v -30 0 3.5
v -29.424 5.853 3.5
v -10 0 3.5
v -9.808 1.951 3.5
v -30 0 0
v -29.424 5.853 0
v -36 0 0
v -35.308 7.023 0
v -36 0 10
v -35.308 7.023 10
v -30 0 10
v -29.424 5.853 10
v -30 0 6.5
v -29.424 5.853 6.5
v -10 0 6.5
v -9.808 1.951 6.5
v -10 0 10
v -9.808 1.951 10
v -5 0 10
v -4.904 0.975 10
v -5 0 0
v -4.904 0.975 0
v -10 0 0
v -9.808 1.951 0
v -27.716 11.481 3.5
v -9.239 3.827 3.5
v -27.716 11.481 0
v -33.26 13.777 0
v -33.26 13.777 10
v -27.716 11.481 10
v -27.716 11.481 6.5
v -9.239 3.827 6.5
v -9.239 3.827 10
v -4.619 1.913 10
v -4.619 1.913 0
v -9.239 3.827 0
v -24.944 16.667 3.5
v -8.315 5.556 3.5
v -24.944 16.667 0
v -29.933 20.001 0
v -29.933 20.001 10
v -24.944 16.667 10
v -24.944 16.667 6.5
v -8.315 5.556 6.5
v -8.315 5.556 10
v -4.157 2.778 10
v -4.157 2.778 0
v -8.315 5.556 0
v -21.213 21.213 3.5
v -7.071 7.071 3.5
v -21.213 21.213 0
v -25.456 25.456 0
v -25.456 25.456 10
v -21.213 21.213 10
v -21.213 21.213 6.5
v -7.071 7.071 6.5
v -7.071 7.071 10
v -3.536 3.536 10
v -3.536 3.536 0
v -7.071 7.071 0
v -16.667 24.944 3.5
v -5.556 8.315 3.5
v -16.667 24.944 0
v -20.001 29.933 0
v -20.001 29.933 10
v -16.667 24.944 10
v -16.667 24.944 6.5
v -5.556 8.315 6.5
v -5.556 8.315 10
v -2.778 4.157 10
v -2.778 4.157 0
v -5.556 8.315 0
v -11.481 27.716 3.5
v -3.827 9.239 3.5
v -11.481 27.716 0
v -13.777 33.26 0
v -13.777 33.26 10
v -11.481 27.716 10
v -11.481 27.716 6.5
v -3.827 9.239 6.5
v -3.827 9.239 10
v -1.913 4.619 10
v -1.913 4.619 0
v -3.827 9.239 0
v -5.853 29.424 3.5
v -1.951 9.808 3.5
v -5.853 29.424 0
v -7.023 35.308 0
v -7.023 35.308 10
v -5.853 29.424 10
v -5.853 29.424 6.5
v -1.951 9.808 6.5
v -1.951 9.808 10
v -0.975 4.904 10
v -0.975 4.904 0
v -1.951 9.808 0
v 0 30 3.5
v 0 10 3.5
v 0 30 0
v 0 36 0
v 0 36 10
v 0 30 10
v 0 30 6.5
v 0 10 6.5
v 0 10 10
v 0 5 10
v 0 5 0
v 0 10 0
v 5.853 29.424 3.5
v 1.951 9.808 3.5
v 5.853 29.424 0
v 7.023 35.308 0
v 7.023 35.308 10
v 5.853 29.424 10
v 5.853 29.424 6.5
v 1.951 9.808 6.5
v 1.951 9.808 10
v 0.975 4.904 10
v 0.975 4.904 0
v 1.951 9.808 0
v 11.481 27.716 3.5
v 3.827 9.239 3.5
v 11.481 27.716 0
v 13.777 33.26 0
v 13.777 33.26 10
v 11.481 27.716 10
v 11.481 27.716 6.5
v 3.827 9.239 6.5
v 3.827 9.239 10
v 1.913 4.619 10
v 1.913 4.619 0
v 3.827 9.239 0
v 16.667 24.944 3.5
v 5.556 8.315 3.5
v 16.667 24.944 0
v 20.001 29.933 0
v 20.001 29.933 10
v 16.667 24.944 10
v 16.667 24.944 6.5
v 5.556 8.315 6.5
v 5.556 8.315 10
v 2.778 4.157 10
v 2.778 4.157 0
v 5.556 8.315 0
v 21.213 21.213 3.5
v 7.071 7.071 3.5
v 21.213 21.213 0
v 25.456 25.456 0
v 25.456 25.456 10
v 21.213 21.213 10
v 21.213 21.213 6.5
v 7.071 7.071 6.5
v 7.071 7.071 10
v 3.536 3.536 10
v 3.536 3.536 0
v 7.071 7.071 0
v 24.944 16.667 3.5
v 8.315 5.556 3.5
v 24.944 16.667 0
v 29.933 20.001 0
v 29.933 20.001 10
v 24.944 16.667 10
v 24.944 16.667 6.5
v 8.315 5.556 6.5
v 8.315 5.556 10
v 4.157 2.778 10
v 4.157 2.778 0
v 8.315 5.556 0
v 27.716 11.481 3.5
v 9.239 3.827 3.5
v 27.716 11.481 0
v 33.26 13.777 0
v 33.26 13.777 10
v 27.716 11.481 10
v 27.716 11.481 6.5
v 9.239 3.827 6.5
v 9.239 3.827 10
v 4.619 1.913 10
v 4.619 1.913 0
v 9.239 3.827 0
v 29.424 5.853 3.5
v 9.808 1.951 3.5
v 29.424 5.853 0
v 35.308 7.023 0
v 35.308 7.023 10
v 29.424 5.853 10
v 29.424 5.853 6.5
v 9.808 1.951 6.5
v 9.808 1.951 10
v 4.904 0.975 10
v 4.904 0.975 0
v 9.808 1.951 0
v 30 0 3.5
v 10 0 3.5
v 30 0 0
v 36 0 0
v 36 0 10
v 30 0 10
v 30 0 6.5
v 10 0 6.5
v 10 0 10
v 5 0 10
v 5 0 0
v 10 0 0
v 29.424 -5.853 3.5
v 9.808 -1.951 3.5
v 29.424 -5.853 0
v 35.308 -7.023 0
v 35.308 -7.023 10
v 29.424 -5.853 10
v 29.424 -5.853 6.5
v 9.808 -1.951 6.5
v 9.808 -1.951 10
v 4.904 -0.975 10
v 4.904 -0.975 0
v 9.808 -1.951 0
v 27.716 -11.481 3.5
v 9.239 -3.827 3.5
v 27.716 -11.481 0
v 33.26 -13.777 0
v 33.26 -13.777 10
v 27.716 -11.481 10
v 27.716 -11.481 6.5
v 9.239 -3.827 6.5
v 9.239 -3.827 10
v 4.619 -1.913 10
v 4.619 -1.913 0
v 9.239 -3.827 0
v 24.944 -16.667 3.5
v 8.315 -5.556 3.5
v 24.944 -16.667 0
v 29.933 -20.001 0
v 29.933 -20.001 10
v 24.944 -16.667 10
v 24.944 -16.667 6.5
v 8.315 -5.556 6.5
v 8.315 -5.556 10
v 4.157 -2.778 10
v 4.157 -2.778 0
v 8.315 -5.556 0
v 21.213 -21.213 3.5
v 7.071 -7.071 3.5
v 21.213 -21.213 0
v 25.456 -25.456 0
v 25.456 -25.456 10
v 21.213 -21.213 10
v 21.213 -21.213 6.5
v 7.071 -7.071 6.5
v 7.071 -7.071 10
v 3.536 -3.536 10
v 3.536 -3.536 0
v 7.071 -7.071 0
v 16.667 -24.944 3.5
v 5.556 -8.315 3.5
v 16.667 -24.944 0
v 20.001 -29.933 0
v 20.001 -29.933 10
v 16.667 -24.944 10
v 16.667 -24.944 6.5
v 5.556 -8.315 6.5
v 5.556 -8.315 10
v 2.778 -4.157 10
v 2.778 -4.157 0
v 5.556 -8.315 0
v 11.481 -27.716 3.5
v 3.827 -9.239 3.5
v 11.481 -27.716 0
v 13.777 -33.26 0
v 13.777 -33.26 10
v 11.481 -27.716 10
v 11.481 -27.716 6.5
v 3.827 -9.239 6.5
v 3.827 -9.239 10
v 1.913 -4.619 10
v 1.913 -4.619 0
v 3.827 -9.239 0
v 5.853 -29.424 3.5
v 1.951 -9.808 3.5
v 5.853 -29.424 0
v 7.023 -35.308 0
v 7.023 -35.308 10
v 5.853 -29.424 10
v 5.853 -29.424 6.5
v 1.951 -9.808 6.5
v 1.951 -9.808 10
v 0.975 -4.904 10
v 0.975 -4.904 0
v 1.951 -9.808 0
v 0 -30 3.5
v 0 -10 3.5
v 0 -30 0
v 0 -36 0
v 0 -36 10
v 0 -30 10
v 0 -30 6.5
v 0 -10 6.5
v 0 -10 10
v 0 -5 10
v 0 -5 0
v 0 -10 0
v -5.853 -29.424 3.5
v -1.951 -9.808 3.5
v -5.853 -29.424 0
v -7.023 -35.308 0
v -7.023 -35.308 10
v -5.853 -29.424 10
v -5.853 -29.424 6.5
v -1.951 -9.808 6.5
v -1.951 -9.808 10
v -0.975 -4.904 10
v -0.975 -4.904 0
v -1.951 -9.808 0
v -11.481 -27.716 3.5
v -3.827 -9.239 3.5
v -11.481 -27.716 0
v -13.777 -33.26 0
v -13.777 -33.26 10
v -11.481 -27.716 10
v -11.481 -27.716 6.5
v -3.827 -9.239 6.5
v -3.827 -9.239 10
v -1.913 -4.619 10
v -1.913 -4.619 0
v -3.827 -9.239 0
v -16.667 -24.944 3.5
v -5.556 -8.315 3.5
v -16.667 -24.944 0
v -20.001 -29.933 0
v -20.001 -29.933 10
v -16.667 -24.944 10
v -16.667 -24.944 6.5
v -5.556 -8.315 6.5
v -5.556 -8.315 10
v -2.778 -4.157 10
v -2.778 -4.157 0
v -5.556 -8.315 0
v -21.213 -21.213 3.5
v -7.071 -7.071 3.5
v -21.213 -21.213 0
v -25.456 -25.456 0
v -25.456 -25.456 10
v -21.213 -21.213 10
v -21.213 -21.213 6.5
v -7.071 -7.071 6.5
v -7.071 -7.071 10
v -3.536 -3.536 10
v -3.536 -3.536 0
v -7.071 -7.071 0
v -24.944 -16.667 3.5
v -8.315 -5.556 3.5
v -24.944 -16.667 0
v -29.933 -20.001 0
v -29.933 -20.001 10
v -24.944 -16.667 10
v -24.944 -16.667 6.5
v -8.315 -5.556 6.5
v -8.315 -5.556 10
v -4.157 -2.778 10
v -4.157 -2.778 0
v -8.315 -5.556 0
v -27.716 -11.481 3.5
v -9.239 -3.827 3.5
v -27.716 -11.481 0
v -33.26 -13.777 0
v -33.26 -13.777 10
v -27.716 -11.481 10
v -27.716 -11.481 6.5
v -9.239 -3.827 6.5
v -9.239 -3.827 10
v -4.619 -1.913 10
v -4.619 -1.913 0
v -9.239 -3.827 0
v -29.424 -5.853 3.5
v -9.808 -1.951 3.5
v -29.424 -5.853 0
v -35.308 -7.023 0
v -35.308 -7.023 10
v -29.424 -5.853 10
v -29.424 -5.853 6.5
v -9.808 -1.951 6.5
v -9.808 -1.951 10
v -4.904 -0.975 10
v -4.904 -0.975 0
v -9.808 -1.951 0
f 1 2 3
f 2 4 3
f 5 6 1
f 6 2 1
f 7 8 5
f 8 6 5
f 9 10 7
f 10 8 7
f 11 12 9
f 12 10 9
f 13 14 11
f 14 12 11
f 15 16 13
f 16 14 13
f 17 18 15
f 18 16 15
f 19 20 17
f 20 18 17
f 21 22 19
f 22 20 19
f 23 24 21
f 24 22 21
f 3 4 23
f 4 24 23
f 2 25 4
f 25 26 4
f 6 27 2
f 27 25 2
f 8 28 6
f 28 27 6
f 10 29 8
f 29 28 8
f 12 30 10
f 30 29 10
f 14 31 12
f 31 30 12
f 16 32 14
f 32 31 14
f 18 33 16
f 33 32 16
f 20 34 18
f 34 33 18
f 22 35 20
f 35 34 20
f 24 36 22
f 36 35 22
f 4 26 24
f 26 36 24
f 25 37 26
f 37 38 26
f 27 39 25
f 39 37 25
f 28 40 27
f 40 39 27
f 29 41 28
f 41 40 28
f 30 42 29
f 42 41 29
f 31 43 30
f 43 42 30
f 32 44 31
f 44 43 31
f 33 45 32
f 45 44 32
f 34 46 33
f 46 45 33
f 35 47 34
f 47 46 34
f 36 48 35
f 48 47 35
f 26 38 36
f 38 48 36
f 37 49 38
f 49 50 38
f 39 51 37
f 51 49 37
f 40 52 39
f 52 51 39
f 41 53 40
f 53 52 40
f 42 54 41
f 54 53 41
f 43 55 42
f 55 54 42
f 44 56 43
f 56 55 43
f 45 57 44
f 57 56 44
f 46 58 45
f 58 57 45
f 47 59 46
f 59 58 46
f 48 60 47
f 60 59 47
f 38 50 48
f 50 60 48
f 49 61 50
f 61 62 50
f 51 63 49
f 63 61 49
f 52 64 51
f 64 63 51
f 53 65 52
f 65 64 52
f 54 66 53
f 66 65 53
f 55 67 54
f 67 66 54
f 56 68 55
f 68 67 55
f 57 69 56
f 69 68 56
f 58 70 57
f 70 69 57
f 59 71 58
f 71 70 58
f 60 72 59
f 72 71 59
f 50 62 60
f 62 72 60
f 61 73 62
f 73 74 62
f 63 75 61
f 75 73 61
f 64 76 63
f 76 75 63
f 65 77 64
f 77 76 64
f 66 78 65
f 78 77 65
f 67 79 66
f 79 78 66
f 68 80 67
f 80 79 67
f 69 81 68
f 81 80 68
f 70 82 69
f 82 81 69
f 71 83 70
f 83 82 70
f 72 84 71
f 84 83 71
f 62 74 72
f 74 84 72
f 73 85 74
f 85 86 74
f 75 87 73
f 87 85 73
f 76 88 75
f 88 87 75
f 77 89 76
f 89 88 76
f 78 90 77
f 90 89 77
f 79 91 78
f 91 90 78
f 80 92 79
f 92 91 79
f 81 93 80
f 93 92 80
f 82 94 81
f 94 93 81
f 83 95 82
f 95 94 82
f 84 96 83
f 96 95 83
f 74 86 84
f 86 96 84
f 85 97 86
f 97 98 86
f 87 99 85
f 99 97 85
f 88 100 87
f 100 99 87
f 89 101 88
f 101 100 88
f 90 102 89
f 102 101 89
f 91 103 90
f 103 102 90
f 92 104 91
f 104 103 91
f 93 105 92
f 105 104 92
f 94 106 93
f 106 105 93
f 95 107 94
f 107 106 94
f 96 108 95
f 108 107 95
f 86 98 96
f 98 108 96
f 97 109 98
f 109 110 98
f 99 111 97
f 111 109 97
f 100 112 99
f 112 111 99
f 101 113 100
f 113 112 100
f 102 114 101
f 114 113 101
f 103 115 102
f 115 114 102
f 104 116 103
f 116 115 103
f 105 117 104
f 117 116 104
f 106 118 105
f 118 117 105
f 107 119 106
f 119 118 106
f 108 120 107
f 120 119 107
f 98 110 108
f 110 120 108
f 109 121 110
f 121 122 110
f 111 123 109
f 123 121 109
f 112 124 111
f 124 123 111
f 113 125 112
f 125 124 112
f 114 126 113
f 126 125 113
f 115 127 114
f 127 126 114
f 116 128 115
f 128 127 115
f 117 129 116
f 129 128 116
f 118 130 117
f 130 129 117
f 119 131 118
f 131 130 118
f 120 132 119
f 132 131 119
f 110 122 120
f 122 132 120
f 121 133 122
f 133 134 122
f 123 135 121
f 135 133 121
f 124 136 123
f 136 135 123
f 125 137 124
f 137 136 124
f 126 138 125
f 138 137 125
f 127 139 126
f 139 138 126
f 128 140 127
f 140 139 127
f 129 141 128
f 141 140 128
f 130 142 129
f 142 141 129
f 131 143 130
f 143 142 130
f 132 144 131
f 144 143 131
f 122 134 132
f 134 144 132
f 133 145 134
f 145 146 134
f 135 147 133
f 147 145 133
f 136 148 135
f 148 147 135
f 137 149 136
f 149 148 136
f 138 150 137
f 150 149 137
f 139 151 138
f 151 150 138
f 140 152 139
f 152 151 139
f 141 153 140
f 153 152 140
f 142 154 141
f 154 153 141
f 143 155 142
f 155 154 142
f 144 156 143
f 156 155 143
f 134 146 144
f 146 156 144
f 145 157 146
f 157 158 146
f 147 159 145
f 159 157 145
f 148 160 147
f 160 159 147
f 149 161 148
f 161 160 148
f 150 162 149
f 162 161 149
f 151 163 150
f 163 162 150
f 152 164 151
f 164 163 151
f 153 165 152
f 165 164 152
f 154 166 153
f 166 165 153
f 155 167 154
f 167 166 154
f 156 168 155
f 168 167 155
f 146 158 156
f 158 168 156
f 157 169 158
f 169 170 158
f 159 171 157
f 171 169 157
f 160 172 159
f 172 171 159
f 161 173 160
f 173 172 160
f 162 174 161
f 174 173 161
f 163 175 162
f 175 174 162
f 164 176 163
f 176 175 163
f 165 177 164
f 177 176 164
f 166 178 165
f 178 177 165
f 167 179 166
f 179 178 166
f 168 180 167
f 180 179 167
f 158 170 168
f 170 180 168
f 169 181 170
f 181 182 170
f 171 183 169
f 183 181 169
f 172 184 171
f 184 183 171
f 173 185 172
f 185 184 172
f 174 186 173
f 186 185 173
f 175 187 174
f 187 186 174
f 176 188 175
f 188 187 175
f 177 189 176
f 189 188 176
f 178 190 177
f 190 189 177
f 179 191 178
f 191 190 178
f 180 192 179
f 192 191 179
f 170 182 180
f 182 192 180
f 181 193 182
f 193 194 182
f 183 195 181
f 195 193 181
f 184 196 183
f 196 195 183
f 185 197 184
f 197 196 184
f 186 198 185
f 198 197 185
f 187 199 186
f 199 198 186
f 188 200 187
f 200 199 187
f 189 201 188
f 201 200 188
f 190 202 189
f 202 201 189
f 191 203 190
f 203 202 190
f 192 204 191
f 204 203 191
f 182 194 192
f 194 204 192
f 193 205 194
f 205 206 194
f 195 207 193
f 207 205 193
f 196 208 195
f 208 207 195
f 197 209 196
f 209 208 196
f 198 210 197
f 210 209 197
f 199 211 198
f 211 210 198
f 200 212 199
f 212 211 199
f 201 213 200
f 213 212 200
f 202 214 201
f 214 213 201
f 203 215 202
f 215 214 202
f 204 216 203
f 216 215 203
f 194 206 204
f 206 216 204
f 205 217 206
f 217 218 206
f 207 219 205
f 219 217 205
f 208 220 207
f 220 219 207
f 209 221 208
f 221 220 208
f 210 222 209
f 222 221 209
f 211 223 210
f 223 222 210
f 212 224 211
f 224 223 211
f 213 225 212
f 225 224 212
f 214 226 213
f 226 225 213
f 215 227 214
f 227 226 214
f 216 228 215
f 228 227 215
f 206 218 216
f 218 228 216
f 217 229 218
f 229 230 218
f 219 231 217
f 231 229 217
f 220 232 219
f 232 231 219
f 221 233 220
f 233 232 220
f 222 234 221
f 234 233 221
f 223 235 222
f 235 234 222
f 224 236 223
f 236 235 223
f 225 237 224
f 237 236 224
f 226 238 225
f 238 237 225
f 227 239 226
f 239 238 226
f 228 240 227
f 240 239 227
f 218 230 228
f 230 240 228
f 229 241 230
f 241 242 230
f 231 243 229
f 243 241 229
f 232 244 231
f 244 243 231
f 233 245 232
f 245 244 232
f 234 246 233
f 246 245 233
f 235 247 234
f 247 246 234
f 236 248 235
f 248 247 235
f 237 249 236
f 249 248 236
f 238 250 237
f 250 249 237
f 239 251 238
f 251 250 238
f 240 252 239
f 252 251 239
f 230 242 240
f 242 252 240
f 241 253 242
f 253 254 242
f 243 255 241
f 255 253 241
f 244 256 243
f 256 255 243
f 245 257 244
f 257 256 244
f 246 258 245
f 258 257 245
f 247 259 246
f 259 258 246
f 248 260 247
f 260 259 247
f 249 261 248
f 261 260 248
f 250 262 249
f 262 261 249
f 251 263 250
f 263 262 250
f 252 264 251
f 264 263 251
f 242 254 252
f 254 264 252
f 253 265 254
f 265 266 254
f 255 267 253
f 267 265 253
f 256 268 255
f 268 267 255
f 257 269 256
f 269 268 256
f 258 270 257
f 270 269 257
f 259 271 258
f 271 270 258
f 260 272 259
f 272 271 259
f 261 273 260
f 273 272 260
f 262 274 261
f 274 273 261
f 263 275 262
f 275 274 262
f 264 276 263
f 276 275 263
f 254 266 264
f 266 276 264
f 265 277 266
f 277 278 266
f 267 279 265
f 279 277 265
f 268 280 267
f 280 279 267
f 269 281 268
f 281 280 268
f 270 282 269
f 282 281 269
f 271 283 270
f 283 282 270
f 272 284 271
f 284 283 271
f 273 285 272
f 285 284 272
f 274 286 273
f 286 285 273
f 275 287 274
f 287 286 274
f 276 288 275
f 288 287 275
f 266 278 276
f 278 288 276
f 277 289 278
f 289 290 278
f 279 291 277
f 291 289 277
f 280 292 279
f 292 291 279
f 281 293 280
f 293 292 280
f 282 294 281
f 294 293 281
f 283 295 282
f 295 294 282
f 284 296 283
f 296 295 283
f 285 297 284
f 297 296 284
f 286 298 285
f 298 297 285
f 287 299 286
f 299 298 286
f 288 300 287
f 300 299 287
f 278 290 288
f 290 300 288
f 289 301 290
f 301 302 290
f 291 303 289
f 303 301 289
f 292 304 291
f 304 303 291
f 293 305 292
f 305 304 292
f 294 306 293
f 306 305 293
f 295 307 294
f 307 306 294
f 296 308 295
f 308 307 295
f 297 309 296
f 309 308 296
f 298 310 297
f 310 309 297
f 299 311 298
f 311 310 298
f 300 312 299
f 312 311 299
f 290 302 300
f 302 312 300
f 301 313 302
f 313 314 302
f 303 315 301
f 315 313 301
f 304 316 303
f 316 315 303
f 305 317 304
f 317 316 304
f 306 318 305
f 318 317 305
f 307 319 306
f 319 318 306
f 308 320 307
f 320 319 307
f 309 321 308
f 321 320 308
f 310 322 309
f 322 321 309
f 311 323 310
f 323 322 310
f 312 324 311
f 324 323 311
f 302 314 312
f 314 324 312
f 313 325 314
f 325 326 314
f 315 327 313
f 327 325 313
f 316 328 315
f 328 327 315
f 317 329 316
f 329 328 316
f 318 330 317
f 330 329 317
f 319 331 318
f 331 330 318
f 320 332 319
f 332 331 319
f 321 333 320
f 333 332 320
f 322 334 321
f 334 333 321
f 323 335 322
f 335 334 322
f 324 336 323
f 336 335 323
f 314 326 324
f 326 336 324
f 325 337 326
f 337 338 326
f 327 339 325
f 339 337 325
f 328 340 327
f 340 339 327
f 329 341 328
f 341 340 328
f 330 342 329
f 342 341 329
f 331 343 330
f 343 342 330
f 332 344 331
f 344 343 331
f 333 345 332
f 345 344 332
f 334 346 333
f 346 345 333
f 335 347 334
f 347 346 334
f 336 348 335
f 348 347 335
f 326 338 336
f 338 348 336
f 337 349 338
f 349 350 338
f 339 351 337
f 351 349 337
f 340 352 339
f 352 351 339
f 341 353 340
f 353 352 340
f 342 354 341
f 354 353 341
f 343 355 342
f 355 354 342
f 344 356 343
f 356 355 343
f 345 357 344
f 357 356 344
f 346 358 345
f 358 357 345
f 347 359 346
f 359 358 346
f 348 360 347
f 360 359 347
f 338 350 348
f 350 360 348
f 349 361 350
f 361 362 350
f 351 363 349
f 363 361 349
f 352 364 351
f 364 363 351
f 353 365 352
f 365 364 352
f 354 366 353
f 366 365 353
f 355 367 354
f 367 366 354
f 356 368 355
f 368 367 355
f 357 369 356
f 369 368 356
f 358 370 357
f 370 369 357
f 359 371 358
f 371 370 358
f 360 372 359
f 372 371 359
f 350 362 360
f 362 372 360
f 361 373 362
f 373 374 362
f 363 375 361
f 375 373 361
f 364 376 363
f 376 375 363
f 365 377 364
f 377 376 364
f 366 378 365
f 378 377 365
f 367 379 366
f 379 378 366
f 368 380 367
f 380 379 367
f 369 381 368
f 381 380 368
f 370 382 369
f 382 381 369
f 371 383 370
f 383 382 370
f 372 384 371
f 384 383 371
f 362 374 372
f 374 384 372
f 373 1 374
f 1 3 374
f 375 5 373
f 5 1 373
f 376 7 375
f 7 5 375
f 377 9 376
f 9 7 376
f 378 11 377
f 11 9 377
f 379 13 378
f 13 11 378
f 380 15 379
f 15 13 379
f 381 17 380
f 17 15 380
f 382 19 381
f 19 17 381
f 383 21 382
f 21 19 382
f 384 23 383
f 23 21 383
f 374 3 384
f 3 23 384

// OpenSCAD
$fn = 32;

// ----------------------------------------------------------------------
// Revolved part: handwheel R36
// ----------------------------------------------------------------------

// --- parameters (mm) ---
bore_r = 5;               // bore radius
rim_r = 36;               // rim radius
rim_w = 6;                // rim axial width
rim_t = 10;               // rim diameter height
hub_r = 10;               // hub radius
web_t = 3;                // web thickness
revolve_angle = 360;      // revolve sweep, degrees

bore_d = 2 * bore_r;
rim_d = 2 * rim_r;
hub_d = 2 * hub_r;

profile = [[5, 0], [10, 0], [10, 3.5], [30, 3.5], [30, 0], [36, 0], [36, 10], [30, 10], [30, 6.5], [10, 6.5], [10, 10], [5, 10]];  // primary outline, 12 points, counter clockwise

// --- the one profile operation ---
rotate_extrude(angle = revolve_angle) polygon(points = profile);
